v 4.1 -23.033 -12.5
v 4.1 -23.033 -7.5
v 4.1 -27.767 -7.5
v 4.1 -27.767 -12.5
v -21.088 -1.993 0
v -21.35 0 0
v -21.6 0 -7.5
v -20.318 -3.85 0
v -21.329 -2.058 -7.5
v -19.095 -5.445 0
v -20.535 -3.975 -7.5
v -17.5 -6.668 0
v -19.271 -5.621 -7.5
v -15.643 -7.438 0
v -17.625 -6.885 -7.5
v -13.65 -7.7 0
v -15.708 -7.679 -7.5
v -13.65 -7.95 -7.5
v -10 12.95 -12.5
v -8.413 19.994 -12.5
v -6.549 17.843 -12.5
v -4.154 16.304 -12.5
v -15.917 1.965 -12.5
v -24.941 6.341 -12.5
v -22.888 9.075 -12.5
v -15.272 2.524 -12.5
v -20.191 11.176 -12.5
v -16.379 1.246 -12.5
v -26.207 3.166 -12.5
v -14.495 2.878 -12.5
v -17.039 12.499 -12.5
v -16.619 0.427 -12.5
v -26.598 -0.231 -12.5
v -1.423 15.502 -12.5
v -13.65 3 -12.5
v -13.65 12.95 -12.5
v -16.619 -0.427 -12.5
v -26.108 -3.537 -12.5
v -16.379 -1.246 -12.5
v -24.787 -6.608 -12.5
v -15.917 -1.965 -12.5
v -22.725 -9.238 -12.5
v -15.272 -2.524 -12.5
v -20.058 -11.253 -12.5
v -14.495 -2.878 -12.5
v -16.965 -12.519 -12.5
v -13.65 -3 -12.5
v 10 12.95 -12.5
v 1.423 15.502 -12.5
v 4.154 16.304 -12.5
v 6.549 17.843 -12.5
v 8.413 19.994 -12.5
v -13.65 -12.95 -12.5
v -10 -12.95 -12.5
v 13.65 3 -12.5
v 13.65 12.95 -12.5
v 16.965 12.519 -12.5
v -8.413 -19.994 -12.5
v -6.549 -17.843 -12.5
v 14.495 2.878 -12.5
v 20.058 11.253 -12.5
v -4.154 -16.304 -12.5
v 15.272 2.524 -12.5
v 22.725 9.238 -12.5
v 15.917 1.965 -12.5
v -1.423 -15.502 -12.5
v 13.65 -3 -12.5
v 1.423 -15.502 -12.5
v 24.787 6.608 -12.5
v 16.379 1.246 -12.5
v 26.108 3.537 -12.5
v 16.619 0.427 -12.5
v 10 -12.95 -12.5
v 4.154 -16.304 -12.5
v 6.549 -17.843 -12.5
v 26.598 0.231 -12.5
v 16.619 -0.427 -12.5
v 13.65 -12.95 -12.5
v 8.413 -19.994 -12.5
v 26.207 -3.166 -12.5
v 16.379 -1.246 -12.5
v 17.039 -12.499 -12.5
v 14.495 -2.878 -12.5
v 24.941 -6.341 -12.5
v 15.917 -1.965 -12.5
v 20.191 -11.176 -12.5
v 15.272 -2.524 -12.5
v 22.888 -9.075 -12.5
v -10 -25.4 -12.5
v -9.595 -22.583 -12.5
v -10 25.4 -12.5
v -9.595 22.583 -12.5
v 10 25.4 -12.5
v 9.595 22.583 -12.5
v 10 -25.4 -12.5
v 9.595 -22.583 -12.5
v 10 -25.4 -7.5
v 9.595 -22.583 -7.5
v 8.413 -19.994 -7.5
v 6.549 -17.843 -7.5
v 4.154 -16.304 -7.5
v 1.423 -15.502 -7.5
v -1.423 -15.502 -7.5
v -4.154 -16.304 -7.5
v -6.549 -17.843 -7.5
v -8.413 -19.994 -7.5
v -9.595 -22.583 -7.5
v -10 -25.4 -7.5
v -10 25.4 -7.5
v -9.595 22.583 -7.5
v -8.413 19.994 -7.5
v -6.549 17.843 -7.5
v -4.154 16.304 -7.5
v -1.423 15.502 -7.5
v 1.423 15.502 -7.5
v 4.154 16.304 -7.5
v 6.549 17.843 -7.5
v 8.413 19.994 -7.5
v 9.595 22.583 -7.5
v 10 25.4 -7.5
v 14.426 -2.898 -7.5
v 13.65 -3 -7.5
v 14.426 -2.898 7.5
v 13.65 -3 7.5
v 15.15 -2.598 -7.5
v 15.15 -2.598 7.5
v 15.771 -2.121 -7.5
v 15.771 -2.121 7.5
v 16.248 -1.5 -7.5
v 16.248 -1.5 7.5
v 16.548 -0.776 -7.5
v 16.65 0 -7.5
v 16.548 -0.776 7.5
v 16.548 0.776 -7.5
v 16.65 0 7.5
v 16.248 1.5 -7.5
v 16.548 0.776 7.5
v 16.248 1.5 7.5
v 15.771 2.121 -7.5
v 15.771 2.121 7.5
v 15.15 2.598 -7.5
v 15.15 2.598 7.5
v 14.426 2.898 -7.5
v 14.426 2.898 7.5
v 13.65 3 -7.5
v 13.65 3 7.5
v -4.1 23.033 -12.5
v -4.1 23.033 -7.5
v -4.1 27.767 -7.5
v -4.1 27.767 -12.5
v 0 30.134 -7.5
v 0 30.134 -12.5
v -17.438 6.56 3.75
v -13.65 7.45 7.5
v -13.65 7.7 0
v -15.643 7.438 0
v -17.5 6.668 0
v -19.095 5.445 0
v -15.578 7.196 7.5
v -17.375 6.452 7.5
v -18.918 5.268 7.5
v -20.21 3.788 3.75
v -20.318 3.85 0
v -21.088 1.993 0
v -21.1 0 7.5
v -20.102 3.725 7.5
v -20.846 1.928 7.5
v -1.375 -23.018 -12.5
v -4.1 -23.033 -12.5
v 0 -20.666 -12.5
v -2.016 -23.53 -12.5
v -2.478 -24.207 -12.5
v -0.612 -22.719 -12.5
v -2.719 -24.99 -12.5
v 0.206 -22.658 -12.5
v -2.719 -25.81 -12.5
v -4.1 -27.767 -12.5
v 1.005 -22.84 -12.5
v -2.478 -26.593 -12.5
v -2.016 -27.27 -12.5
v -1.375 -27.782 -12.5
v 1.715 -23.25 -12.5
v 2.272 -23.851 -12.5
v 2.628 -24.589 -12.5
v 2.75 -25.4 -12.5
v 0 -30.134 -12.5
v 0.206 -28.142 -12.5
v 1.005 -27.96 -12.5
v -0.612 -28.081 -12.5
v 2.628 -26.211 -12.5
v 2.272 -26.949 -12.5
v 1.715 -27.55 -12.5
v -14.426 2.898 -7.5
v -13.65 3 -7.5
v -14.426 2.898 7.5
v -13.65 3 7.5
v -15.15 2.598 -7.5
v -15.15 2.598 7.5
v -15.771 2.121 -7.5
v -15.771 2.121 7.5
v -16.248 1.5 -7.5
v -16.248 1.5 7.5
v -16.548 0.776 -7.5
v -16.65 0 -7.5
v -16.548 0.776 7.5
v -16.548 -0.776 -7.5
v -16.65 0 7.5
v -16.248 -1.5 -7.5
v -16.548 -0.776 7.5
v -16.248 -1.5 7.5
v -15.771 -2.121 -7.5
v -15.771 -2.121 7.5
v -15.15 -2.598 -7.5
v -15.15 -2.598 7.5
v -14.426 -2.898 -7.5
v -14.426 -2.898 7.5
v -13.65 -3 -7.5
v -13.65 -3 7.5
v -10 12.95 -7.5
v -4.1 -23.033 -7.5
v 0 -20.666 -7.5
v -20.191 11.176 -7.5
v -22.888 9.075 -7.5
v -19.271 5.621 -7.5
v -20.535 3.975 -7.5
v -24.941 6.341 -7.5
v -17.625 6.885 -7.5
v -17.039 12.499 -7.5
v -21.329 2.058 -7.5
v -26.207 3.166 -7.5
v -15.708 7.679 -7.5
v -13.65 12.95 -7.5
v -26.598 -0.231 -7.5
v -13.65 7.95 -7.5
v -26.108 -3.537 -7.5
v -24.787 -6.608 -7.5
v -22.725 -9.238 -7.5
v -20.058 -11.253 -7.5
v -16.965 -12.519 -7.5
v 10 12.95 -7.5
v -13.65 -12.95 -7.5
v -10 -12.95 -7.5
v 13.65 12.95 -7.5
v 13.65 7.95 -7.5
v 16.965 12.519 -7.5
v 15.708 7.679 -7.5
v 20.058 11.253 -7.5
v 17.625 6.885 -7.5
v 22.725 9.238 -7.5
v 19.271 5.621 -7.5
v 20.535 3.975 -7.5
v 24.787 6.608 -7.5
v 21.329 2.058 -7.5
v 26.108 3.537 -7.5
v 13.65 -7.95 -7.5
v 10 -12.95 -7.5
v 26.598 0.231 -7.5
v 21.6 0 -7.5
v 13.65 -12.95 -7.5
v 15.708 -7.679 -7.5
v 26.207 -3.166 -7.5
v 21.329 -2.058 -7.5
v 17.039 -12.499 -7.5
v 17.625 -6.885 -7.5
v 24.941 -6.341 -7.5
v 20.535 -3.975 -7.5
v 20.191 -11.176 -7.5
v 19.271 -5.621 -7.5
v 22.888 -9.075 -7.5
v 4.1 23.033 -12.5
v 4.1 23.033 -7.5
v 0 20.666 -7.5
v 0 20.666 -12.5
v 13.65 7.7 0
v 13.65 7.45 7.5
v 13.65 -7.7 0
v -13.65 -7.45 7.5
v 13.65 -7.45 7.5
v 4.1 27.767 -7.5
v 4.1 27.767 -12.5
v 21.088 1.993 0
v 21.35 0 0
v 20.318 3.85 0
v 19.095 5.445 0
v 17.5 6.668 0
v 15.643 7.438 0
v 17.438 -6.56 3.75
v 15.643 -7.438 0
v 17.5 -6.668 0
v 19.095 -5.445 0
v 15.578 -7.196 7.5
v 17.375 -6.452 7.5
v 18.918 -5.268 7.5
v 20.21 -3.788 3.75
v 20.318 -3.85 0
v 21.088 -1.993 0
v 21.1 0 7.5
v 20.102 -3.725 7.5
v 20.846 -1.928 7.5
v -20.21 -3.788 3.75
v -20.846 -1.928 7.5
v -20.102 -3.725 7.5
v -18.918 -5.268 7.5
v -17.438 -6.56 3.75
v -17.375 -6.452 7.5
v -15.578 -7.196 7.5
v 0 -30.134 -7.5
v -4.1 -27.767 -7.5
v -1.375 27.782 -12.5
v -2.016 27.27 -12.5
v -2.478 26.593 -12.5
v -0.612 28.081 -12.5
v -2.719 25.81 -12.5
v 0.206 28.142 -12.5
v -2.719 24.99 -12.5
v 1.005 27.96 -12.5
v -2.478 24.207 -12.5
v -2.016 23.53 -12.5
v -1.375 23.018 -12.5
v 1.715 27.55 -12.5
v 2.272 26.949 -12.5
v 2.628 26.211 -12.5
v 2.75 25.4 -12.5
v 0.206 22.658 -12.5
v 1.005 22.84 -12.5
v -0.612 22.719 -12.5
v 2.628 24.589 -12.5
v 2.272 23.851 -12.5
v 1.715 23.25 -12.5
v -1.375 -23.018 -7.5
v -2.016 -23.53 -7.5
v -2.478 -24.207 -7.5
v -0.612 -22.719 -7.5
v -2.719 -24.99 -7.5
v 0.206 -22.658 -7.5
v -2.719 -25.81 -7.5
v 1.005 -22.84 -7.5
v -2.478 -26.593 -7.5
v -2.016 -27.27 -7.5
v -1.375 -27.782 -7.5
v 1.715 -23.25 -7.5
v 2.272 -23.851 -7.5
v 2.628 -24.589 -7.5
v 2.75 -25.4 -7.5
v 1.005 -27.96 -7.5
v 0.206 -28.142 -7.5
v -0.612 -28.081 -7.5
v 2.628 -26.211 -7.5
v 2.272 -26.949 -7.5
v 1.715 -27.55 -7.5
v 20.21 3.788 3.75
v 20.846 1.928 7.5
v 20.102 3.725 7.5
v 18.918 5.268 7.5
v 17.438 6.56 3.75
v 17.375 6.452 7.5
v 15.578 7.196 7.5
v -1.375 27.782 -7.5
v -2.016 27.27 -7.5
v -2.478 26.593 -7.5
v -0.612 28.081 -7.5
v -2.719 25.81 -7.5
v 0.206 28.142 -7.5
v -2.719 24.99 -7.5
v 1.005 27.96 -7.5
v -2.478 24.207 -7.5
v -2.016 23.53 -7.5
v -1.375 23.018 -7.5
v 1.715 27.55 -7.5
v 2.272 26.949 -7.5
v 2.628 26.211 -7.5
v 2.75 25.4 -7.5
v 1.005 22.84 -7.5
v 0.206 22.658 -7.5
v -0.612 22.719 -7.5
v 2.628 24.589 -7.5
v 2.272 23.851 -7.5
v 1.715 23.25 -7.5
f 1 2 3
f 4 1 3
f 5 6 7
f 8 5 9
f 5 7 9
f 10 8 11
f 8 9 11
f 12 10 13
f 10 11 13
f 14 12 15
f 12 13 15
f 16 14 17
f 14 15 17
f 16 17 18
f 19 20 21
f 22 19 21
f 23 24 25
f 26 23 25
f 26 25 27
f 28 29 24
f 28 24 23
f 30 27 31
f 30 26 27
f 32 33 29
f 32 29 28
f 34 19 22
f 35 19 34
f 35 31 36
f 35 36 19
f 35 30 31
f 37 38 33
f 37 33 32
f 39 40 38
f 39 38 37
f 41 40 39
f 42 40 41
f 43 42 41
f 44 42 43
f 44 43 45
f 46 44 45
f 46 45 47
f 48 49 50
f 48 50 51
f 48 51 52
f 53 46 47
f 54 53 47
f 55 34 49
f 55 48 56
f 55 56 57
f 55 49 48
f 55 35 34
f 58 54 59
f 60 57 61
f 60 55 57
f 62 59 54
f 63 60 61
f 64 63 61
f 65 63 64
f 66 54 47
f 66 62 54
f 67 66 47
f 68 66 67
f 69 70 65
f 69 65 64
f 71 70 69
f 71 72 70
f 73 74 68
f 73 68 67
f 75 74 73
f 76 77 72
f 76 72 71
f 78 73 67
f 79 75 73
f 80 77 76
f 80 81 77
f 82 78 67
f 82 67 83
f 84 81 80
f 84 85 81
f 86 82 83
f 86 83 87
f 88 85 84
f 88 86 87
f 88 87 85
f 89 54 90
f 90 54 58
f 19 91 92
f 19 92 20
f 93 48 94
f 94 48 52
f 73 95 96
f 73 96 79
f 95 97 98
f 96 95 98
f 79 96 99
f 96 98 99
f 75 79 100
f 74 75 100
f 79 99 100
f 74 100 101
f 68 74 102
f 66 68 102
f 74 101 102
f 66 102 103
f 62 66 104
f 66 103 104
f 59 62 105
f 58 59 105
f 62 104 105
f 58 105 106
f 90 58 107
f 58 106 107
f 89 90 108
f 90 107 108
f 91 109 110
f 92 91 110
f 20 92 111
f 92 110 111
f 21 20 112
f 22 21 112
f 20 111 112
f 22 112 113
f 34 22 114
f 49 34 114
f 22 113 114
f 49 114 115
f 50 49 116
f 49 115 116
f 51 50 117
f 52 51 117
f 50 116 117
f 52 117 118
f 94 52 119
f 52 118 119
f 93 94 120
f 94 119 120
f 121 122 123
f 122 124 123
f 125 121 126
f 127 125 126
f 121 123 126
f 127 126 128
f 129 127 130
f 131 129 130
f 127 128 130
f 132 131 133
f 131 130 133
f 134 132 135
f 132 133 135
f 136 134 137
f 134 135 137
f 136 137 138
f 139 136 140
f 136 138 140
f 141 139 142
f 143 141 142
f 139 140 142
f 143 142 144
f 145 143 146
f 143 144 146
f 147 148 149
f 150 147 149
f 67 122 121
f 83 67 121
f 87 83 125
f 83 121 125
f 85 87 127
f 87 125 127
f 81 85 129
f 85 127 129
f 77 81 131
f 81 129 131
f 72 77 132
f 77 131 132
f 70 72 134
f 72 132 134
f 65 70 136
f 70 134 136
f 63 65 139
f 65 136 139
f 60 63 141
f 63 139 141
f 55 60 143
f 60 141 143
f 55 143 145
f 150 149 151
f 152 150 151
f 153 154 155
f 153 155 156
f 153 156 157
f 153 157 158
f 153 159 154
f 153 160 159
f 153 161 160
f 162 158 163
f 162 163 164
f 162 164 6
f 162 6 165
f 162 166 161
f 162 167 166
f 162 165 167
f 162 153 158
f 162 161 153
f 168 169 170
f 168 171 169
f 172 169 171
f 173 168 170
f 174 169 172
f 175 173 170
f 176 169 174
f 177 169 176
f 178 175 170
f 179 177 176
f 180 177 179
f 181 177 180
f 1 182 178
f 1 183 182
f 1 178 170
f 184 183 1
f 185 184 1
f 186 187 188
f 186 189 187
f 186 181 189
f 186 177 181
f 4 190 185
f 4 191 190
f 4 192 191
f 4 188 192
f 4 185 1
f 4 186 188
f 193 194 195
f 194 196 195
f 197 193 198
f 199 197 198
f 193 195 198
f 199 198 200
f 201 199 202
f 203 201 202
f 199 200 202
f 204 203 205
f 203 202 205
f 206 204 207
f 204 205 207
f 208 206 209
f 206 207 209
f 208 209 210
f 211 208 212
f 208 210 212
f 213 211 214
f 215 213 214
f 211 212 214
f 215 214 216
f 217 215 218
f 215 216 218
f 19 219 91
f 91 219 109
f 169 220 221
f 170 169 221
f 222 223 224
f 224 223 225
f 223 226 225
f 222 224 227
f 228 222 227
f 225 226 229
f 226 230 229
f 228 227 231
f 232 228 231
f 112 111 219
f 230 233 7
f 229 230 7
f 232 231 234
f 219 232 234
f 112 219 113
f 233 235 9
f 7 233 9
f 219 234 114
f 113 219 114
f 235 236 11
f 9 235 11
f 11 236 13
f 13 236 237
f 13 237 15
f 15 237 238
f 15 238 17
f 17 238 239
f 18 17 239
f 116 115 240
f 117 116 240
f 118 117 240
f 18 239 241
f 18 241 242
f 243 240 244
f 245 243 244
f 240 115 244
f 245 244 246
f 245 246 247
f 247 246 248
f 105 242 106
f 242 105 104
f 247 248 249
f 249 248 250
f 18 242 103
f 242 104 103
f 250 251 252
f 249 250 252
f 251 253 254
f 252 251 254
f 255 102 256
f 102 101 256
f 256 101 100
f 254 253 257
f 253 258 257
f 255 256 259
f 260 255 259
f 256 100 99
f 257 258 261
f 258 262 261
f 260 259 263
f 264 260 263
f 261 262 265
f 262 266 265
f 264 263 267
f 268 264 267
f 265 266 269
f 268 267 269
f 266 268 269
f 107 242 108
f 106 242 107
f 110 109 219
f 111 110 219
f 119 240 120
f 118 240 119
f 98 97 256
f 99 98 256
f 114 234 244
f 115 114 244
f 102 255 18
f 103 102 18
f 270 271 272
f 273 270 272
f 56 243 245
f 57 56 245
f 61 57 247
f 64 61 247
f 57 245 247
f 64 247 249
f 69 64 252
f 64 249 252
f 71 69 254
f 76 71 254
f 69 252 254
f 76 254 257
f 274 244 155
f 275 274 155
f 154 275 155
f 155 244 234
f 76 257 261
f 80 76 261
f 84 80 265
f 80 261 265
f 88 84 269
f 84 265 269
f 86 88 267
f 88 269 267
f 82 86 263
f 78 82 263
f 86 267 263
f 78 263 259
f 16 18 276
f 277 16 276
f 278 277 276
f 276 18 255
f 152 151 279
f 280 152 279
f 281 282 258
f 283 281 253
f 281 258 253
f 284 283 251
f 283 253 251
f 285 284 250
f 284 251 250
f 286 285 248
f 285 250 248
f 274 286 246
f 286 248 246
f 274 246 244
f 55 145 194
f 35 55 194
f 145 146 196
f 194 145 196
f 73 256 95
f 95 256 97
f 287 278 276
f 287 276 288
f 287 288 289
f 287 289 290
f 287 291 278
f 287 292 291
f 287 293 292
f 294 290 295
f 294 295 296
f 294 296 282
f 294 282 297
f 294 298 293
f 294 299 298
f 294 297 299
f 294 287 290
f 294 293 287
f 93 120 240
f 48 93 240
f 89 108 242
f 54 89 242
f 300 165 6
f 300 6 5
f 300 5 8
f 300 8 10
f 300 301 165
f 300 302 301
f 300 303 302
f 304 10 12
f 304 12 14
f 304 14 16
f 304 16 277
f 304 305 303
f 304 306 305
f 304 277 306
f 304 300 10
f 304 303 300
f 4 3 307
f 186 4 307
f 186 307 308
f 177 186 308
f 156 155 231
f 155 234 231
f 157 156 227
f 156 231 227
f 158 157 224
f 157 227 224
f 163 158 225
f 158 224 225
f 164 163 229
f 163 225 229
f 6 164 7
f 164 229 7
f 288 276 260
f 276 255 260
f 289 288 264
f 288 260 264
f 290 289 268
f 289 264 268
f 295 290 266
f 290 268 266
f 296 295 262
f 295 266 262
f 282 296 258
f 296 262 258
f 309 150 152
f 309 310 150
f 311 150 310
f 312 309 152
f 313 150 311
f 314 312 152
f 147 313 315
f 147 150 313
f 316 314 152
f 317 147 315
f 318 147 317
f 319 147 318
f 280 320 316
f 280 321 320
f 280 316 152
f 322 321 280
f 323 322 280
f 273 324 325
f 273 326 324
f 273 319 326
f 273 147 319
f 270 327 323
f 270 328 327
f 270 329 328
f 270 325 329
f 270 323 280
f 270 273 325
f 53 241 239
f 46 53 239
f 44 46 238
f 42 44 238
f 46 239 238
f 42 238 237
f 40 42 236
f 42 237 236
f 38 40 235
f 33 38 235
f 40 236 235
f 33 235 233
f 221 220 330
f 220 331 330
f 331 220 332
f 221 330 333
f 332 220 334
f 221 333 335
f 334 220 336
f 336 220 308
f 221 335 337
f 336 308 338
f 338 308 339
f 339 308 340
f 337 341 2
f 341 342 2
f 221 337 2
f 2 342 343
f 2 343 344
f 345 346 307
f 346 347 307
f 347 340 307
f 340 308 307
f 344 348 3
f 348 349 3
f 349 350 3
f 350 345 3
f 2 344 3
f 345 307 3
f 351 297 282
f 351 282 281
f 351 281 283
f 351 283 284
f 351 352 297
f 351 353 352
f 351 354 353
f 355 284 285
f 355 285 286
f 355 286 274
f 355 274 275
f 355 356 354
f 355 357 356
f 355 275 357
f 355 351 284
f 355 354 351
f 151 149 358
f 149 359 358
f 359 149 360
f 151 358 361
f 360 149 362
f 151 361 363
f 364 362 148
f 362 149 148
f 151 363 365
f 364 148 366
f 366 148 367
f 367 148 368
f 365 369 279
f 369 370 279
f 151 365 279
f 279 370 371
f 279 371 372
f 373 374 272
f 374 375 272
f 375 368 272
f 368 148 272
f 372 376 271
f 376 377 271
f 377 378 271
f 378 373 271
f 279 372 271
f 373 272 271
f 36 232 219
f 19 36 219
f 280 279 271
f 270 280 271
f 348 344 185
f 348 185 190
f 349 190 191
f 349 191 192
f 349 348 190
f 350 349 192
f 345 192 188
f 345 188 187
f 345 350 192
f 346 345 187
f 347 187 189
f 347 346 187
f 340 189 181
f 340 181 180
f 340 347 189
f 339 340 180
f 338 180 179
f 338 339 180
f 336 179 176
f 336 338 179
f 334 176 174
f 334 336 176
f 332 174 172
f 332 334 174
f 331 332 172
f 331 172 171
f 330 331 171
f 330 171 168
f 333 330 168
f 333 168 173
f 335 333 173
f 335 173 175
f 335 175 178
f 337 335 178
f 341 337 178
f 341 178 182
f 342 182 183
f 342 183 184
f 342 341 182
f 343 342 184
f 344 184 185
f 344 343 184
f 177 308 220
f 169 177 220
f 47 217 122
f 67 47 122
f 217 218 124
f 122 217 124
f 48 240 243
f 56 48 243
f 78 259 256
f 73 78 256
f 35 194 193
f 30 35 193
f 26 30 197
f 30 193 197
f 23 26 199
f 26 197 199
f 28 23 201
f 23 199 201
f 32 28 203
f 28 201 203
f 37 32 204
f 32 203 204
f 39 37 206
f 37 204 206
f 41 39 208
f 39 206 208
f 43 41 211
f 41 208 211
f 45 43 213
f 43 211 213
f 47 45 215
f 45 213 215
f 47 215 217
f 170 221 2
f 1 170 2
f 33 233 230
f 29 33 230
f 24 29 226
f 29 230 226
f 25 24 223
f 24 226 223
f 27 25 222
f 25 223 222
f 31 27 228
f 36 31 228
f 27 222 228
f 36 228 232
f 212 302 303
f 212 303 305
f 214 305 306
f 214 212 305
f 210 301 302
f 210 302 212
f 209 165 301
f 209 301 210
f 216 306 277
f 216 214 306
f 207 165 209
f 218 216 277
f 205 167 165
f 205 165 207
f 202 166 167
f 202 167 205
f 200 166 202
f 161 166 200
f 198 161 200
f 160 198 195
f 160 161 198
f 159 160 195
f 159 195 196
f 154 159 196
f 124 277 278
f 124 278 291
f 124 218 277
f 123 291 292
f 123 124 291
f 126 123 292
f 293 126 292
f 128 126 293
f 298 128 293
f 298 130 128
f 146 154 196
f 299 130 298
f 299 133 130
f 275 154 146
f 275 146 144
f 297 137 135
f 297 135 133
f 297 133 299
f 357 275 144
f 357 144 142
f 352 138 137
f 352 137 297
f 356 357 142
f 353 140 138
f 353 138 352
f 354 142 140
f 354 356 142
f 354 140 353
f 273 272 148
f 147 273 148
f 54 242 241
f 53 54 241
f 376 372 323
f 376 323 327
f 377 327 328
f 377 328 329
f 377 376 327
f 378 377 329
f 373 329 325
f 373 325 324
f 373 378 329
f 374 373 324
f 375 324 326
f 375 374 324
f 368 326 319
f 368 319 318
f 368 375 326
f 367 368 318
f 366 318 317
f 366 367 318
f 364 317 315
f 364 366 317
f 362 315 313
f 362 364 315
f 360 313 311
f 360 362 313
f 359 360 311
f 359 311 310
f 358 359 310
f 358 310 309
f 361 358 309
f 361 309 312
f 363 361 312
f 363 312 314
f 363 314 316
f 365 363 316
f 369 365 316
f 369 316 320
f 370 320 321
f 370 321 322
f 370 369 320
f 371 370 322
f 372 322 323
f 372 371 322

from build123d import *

# Parameters (mm, degrees)
F2_DEPTH      = 7.5
F2_TAPER      = 1.909
F2_DEPTH_BACK = 7.5
F2_TAPER_BACK = -1.909
F3_DEPTH      = 7.5
F3_DEPTH_BACK = 7.5
F5_DEPTH      = 5
F4_R          = 2.75


# Not quite as in the source:
# - a feature of the source that left no trace in its solid (it failed there, or was rolled back) is left out
# - a feature names something its author has since deleted; it is built from what else it names


with BuildPart() as f2:
    # F0 (on Top) → F2 (new body, two sides)
    with BuildSketch(Plane.XY) as f2_sk:
        with BuildLine():
            Line((13.65, 7.7), (-13.65, 7.7))
            ThreePointArc((-13.65, 7.7), (-19.0947222151, 5.4447222151), (-21.35, 0))
            ThreePointArc((-21.35, 0), (-19.0947222151, -5.4447222151), (-13.65, -7.7))
            Line((-13.65, -7.7), (13.65, -7.7))
            ThreePointArc((13.65, -7.7), (19.0947222151, -5.4447222151), (21.35, 0))
            ThreePointArc((21.35, 0), (19.0947222151, 5.4447222151), (13.65, 7.7))
        make_face()
    extrude(amount=F2_DEPTH, taper=F2_TAPER)
    extrude(f2_sk.sketch, amount=-F2_DEPTH_BACK, taper=F2_TAPER_BACK)

    # F1 (on Top) → F3 (cut, two sides)
    with BuildSketch(Plane.XY) as f3_sk:
        with BuildLine():
            Line((13.65, 3), (-13.65, 3))
            ThreePointArc((-13.65, 3), (-15.7713203436, 2.1213203436), (-16.65, 0))
            ThreePointArc((-16.65, 0), (-15.7713203436, -2.1213203436), (-13.65, -3))
            Line((-13.65, -3), (13.65, -3))
            ThreePointArc((13.65, -3), (15.7713203436, -2.1213203436), (16.65, 0))
            ThreePointArc((16.65, 0), (15.7713203436, 2.1213203436), (13.65, 3))
        make_face()
    extrude(amount=F3_DEPTH, mode=Mode.SUBTRACT)
    extrude(f3_sk.sketch, amount=-F3_DEPTH_BACK, mode=Mode.SUBTRACT)

    # F4 (on face) → F5 (join)
    with BuildSketch(Plane(origin=(0, 0, -7.5), x_dir=(1, 0, 0), z_dir=(0, 0, -1))):
        with BuildLine():
            Line((-10, 12.9499800244), (-13.65, 12.9499800244))
            ThreePointArc((-13.65, 12.9499800244), (-22.7251585222, 9.2381535184), (-26.597928487, 0.2305006046))
            ThreePointArc((-26.597928487, 0.2305006046), (-22.8881535184, -9.0751585222), (-13.65, -12.9499800244))
            Line((-13.65, -12.9499800244), (-10, -12.9499800244))
            Line((-10, -12.9499800244), (10, -12.9499800244))
            Line((10, -12.9499800244), (13.65, -12.9499800244))
            ThreePointArc((13.65, -12.9499800244), (22.7251585222, -9.2381535184), (26.597928487, -0.2305006046))
            ThreePointArc((26.597928487, -0.2305006046), (22.8881535184, 9.0751585222), (13.65, 12.9499800244))
            Line((13.65, 12.9499800244), (10, 12.9499800244))
            Line((10, 12.9499800244), (-10, 12.9499800244))
        make_face()
        with BuildLine():
            Line((13.65, -7.9499800244), (-13.65, -7.9499800244))
            ThreePointArc((-13.65, -7.9499800244), (-19.2714847855, -5.6214847855), (-21.5999800244, 0))
            ThreePointArc((-21.5999800244, 0), (-19.2714847855, 5.6214847855), (-13.65, 7.9499800244))
            Line((-13.65, 7.9499800244), (13.65, 7.9499800244))
            ThreePointArc((13.65, 7.9499800244), (19.2714847855, 5.6214847855), (21.5999800244, 0))
            ThreePointArc((21.5999800244, 0), (19.2714847855, -5.6214847855), (13.65, -7.9499800244))
        make_face(mode=Mode.SUBTRACT)
        with BuildLine():
            ThreePointArc((-21.5999800244, 0), (-19.2714847855, -5.6214847855), (-13.65, -7.9499800244))
            Line((-13.65, -7.9499800244), (13.65, -7.9499800244))
            ThreePointArc((13.65, -7.9499800244), (19.2714847855, -5.6214847855), (21.5999800244, 0))
            ThreePointArc((21.5999800244, 0), (19.2714847855, 5.6214847855), (13.65, 7.9499800244))
            Line((13.65, 7.9499800244), (-13.65, 7.9499800244))
            ThreePointArc((-13.65, 7.9499800244), (-19.2714847855, 5.6214847855), (-21.5999800244, 0))
        make_face()
        with BuildLine():
            ThreePointArc((13.65, 3), (16.65, 0), (13.65, -3))
            Line((13.65, -3), (-13.65, -3))
            ThreePointArc((-13.65, -3), (-16.65, 0), (-13.65, 3))
            Line((-13.65, 3), (13.65, 3))
        make_face(mode=Mode.SUBTRACT)
        with BuildLine():
            Line((-10, 25.4), (-10, 12.9499800244))
            Line((-10, 12.9499800244), (10, 12.9499800244))
            Line((10, 12.9499800244), (10, 25.4))
            ThreePointArc((10, 25.4), (0, 15.4), (-10, 25.4))
        make_face()
        with BuildLine():
            Line((10, -12.9499800244), (-10, -12.9499800244))
            Line((-10, -12.9499800244), (-10, -25.4))
            ThreePointArc((-10, -25.4), (0, -15.4), (10, -25.4))
            Line((10, -25.4), (10, -12.9499800244))
        make_face()
    extrude(amount=F5_DEPTH)


with BuildPart() as f5:
    # F4 (on face) → F5, piece 2 (new body)
    with BuildSketch(Plane(origin=(0, 0, -7.5), x_dir=(1, 0, 0), z_dir=(0, 0, -1))):
        Polygon((4.1, -23.0328638963), (0, -20.6657277926), (-4.1, -23.0328638963), (-4.1, -27.7671361037), (0, -30.1342722074), (4.1, -27.7671361037), align=None)
        with Locations((0, -25.4)):
            Circle(F4_R, mode=Mode.SUBTRACT)
    extrude(amount=F5_DEPTH)


with BuildPart() as f5b:
    # F4 (on face) → F5, piece 3 (new body)
    with BuildSketch(Plane(origin=(0, 0, -7.5), x_dir=(1, 0, 0), z_dir=(0, 0, -1))):
        Polygon((4.1, 23.0328638963), (4.1, 27.7671361037), (0, 30.1342722074), (-4.1, 27.7671361037), (-4.1, 23.0328638963), (0, 20.6657277926), align=None)
        with Locations((0, 25.4)):
            Circle(F4_R, mode=Mode.SUBTRACT)
    extrude(amount=F5_DEPTH)


solid = Compound([f2.part, f5.part, f5b.part])
